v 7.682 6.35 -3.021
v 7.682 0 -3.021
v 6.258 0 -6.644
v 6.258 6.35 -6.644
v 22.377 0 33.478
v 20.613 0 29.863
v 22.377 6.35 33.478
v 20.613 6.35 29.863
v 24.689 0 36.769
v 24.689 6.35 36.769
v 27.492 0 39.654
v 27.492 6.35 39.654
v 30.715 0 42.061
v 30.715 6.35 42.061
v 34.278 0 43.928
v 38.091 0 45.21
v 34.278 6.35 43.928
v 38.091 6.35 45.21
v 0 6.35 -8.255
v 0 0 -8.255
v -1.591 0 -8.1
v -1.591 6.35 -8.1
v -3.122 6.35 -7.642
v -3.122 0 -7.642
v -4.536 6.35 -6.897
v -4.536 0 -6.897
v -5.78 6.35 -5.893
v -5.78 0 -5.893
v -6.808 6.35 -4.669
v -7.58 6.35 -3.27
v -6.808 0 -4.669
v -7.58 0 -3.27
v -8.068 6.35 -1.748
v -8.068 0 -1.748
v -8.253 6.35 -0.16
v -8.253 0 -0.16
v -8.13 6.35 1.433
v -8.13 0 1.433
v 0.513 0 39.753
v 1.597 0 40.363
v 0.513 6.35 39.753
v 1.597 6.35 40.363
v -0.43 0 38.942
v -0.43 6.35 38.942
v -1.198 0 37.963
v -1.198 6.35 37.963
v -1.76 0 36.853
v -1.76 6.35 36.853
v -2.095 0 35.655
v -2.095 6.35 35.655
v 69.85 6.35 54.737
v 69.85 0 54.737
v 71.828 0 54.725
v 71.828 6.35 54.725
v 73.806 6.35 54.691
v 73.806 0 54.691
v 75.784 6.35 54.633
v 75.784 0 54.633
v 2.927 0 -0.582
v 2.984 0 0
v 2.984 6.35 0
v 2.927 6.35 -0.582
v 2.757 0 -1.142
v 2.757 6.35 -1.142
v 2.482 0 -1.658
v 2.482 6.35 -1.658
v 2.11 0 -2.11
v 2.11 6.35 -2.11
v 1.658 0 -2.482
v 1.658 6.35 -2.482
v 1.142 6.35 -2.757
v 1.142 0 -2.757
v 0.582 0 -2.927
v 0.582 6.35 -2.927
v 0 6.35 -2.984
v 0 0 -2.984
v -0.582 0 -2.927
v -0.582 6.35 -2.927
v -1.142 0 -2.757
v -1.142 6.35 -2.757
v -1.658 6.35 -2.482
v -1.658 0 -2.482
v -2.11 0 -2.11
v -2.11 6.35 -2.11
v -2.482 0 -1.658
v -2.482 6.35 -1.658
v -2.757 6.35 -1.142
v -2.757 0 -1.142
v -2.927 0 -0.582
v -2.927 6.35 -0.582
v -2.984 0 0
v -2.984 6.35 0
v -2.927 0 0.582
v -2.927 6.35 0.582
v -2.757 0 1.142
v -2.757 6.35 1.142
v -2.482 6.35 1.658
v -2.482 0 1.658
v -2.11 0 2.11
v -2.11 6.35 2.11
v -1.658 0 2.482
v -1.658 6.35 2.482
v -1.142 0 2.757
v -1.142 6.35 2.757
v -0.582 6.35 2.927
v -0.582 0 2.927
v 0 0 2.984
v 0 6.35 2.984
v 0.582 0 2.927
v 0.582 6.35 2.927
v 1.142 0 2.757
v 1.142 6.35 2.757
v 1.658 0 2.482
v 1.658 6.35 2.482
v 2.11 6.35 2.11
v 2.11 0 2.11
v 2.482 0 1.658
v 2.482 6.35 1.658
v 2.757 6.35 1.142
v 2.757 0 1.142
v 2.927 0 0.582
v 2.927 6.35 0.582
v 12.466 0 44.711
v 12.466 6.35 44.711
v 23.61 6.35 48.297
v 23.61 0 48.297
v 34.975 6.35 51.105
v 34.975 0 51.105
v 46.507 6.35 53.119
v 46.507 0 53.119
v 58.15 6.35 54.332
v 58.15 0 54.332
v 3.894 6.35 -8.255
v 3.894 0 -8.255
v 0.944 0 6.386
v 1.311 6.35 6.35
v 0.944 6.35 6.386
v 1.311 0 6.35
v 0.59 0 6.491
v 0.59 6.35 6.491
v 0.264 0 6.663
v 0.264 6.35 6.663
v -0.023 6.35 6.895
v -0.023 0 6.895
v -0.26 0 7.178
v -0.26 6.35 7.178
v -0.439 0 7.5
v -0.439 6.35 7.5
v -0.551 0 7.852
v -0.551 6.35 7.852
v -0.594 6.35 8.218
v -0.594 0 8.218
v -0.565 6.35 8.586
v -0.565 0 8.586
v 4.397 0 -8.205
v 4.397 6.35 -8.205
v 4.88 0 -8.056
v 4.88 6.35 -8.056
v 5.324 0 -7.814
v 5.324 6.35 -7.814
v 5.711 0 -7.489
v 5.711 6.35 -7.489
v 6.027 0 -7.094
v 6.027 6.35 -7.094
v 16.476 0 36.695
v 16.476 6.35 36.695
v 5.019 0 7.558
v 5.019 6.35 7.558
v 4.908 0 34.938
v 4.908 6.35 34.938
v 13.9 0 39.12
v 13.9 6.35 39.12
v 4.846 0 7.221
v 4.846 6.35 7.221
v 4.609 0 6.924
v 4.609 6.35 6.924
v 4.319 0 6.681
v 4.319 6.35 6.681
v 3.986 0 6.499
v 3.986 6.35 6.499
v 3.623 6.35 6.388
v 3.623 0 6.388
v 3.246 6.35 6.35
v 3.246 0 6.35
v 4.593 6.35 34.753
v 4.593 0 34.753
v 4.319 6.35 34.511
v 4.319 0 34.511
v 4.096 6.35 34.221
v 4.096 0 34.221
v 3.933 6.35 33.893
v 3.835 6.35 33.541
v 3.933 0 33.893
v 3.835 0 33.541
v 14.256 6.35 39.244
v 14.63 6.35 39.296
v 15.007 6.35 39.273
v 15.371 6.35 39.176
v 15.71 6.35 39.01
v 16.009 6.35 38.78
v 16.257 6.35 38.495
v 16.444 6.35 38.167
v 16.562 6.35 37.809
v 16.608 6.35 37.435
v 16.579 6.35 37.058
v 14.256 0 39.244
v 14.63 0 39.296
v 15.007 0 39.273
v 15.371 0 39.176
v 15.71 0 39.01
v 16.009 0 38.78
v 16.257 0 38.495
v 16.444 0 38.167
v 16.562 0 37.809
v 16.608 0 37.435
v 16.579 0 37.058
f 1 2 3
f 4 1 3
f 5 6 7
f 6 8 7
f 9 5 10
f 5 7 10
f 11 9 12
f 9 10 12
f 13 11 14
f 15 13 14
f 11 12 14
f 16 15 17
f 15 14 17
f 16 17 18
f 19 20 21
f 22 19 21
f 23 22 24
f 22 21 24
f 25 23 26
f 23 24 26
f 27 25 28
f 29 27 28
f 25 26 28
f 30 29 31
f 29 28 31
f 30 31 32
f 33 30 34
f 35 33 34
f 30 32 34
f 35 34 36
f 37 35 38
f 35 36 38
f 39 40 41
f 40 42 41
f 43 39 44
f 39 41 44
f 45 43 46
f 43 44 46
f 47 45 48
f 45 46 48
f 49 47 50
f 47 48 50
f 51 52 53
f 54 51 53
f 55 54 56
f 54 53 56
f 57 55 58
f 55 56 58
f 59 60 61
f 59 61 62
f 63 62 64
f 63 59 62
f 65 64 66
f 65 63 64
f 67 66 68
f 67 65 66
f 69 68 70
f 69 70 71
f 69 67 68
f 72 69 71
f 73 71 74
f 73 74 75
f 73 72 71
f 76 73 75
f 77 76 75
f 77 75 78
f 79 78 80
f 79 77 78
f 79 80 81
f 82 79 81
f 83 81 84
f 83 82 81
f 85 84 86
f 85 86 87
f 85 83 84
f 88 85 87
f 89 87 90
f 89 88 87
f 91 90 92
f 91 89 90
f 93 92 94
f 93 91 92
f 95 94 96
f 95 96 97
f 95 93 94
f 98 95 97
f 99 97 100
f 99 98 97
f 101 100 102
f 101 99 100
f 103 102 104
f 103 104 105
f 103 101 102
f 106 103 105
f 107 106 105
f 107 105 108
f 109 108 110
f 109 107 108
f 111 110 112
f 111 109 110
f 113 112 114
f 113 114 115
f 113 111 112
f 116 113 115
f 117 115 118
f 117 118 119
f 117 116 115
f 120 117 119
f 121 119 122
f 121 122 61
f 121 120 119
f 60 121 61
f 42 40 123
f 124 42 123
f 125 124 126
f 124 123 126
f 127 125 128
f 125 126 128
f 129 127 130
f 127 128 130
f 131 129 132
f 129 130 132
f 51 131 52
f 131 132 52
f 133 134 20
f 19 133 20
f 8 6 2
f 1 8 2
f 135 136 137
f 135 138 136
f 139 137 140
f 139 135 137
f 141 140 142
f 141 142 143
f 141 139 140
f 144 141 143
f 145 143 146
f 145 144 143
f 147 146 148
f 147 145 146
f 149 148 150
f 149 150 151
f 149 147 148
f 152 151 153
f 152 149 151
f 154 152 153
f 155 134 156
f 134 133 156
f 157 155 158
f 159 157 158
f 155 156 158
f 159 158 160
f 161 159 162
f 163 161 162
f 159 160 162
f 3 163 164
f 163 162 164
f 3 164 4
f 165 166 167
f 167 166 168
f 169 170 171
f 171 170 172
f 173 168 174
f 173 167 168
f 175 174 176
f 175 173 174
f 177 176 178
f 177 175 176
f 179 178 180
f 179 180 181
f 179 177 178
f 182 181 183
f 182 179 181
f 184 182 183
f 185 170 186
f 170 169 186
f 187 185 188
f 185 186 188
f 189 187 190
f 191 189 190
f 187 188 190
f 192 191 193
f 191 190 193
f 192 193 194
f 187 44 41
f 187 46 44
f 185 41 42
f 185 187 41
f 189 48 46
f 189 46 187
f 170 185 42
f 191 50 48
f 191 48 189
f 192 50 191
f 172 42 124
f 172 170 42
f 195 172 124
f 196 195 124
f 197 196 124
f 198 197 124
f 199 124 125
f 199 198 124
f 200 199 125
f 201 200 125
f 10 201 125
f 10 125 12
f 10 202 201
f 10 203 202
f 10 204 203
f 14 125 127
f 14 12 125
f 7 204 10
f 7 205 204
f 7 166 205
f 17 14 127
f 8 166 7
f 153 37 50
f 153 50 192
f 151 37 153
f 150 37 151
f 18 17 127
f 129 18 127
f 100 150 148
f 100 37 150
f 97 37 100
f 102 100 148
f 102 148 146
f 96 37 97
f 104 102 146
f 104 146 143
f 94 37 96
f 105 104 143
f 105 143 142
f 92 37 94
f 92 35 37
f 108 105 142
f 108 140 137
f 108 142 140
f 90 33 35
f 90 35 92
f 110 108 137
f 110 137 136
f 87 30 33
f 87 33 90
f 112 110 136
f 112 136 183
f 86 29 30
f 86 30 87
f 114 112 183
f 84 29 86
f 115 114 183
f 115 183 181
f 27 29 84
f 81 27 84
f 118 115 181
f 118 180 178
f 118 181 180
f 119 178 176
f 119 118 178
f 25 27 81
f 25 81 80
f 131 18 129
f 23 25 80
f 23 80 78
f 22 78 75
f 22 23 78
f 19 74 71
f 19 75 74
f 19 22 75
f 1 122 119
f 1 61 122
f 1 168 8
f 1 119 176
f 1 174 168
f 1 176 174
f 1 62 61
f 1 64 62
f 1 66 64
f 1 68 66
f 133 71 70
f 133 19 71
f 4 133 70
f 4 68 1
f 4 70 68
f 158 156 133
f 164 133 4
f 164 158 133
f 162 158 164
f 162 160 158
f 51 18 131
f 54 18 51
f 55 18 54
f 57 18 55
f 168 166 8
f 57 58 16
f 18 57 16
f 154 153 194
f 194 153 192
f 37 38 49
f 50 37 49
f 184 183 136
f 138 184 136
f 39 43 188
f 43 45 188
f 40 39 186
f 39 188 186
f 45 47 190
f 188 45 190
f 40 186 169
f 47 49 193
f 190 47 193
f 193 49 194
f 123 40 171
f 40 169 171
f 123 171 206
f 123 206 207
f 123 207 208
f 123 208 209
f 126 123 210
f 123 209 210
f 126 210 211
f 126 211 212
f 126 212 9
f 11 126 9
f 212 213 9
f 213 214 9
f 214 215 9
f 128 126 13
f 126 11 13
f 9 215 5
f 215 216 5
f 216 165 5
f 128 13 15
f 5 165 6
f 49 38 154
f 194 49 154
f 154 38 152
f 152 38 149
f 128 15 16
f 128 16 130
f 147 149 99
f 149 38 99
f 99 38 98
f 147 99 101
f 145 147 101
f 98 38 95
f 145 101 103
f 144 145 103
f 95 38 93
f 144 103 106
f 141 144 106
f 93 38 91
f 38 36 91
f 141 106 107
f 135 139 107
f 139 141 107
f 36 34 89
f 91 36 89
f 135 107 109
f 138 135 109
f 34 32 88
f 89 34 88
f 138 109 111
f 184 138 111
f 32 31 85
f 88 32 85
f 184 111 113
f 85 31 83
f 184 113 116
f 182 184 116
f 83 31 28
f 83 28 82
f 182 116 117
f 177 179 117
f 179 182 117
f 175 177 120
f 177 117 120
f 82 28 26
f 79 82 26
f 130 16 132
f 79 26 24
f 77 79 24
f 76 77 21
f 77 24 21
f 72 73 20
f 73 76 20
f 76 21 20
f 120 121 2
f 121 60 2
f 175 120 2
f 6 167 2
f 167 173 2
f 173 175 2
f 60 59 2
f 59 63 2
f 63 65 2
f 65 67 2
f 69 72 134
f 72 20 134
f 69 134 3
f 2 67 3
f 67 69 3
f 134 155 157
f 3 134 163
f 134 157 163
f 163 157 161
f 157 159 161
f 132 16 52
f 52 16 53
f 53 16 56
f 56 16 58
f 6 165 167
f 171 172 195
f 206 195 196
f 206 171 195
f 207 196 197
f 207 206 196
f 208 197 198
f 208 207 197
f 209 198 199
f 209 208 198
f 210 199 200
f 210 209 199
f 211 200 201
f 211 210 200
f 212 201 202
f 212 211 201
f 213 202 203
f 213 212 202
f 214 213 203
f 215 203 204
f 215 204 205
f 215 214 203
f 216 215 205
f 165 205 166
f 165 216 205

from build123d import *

# Parameters (mm, degrees)
SKETCH1_R           = 2.9845
BOSS_EXTRUDE1_DEPTH = 6.35
CUT_EXTRUDE1_DEPTH  = 7.35
FILLET1_R           = 25.4
FILLET2_R           = 6.35
FILLET3_R           = 1.905
FILLET4_R           = 2.54


with BuildPart() as part:
    # Sketch1 → Boss-Extrude1 (new body)
    with BuildSketch(Plane(origin=(0, 0, 0), x_dir=(1, 0, 0), z_dir=(0, 1, 0))):
        with BuildLine():
            Line((7.682408093, 3.020865917), (5.624249106, 8.255))
            Line((5.624249106, 8.255), (0, 8.255))
            ThreePointArc((0, 8.255), (-6.323696878, 5.306211718), (-8.129588001, -1.433465707))
            Line((-8.129588001, -1.433465707), (-1.513592432, -38.954641096))
            ThreePointArc((-1.513592432, -38.954641096), (33.306036144, -50.744311292), (69.85, -54.737))
            ThreePointArc((69.85, -54.737), (72.817340251, -54.71098351), (75.783768162, -54.632942041))
            Line((75.783768162, -54.632942041), (25.4, -42.037))
            Line((25.4, -42.037), (7.682408093, 3.020865917))
        make_face()
        Circle(SKETCH1_R, mode=Mode.SUBTRACT)
    extrude(amount=BOSS_EXTRUDE1_DEPTH)

    # Sketch2 → Cut-Extrude1 (cut, through all)
    with BuildSketch(Plane(origin=(0, 6.35, 0), x_dir=(1, 0, 0), z_dir=(0, 1, 0))):
        Polygon((4.007338902, -34.519082642), (18.219473265, -41.128490063), (4.543923357, -6.35), (-0.959630389, -6.35), align=None)
    extrude(amount=-CUT_EXTRUDE1_DEPTH, mode=Mode.SUBTRACT)

    # Fillet1
    fillet1_edges = [part.edges().sort_by_distance(p)[0] for p in [
        (25.4, 3.175, 42.037),
    ]]
    fillet(fillet1_edges, radius=FILLET1_R)

    # Fillet2
    fillet2_edges = [part.edges().sort_by_distance(p)[0] for p in [
        (-1.513592432, 3.175, 38.954641096),
    ]]
    fillet(fillet2_edges, radius=FILLET2_R)

    # Fillet3
    fillet3_edges = [part.edges().sort_by_distance(p)[0] for p in [
        (-0.959630389, 3.175, 6.35),
        (4.543923357, 3.175, 6.35),
        (18.219473265, 3.175, 41.128490063),
        (4.007338902, 3.175, 34.519082642),
    ]]
    fillet(fillet3_edges, radius=FILLET3_R)

    # Fillet4
    fillet4_edges = [part.edges().sort_by_distance(p)[0] for p in [
        (5.624249106, 3.175, -8.255),
    ]]
    fillet(fillet4_edges, radius=FILLET4_R)


solid = part.part
